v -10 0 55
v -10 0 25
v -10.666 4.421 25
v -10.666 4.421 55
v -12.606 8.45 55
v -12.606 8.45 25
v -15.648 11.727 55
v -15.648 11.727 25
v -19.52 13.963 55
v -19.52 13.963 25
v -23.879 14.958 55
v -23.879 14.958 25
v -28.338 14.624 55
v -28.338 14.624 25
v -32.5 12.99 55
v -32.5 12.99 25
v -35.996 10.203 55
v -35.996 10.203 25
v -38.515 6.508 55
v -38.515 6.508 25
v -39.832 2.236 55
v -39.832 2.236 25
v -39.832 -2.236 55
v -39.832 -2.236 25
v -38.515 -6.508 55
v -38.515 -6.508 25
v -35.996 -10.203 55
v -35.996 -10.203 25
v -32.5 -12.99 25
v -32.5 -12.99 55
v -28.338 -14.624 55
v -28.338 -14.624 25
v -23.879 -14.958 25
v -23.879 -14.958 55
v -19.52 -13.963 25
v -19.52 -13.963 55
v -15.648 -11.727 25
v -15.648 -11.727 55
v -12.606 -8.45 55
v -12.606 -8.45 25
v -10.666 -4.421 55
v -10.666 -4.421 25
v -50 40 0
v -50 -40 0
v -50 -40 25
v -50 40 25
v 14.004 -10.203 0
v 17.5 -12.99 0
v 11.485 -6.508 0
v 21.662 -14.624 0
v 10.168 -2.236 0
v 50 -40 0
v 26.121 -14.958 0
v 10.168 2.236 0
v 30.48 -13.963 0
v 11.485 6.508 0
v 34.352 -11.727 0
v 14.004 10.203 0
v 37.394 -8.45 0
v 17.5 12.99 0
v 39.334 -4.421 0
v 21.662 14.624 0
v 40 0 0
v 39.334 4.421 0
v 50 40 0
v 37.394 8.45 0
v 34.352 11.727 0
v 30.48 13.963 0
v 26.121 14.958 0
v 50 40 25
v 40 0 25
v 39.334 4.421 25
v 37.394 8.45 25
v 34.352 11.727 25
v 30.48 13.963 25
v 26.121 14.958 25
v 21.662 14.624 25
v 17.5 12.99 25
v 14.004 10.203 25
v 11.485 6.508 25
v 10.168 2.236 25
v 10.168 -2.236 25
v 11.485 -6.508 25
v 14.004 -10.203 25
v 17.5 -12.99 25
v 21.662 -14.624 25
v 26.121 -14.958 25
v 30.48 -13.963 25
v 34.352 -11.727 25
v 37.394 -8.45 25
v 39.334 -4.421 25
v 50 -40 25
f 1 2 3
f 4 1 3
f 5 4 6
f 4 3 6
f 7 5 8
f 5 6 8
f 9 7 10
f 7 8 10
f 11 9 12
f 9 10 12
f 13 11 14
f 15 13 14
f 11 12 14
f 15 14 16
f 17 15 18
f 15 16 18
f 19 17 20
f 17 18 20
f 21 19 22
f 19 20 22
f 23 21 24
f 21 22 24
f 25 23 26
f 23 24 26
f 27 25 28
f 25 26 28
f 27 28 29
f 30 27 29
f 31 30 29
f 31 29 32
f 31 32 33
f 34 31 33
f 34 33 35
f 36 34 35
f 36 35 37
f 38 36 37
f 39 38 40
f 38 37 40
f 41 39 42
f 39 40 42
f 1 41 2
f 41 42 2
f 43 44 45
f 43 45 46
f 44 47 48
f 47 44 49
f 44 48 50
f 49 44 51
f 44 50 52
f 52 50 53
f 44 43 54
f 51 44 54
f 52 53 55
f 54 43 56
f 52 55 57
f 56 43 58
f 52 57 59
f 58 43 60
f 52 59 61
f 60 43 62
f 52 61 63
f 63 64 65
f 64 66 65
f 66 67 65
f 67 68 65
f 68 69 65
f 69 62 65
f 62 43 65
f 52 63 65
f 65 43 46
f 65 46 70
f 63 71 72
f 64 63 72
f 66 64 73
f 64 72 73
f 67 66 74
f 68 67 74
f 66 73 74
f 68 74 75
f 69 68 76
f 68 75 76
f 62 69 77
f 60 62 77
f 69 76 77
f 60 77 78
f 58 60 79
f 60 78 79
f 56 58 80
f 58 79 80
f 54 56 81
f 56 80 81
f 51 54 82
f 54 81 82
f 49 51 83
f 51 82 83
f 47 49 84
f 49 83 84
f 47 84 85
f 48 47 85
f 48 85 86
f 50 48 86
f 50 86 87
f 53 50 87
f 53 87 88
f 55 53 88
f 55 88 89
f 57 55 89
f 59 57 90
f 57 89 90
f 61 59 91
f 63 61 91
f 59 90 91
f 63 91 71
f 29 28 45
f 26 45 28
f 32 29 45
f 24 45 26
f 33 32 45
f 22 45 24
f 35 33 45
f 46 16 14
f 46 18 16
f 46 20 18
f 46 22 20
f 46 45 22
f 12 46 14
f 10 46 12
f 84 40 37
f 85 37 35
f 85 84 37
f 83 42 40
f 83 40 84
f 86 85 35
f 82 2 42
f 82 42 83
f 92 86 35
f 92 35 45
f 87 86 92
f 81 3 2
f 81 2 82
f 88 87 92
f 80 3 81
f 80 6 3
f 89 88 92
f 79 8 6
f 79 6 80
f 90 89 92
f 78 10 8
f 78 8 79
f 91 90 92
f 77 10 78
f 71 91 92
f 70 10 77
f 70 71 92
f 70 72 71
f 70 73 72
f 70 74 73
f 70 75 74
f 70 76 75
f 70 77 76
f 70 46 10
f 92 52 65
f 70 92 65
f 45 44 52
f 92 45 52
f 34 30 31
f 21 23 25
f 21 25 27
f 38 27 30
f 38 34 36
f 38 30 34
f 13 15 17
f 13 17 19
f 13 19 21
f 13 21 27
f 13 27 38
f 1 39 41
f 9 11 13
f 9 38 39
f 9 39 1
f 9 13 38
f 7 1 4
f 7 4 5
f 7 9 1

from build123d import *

# Parameters (mm, degrees)
F0_W     = 100
F0_H     = 80
F1_DEPTH = 25
F2_R     = 15
F3_DEPTH = 30
F4_R     = 15
F5_DEPTH = 25


with BuildPart() as f1:
    # F0 (on Top) → F1 (new body)
    with BuildSketch(Plane.XY):
        Rectangle(F0_W, F0_H)
    extrude(amount=F1_DEPTH)

    # F2 (on face) → F3 (join)
    with BuildSketch(Plane.XY.offset(25)):
        with Locations((-25, 0)):
            Circle(F2_R)
    extrude(amount=F3_DEPTH)

    # F4 (on face) → F5 (cut)
    with BuildSketch(Plane.XY.offset(25)):
        with Locations((25, 0)):
            Circle(F4_R)
    extrude(amount=-F5_DEPTH, mode=Mode.SUBTRACT)


solid = f1.part
